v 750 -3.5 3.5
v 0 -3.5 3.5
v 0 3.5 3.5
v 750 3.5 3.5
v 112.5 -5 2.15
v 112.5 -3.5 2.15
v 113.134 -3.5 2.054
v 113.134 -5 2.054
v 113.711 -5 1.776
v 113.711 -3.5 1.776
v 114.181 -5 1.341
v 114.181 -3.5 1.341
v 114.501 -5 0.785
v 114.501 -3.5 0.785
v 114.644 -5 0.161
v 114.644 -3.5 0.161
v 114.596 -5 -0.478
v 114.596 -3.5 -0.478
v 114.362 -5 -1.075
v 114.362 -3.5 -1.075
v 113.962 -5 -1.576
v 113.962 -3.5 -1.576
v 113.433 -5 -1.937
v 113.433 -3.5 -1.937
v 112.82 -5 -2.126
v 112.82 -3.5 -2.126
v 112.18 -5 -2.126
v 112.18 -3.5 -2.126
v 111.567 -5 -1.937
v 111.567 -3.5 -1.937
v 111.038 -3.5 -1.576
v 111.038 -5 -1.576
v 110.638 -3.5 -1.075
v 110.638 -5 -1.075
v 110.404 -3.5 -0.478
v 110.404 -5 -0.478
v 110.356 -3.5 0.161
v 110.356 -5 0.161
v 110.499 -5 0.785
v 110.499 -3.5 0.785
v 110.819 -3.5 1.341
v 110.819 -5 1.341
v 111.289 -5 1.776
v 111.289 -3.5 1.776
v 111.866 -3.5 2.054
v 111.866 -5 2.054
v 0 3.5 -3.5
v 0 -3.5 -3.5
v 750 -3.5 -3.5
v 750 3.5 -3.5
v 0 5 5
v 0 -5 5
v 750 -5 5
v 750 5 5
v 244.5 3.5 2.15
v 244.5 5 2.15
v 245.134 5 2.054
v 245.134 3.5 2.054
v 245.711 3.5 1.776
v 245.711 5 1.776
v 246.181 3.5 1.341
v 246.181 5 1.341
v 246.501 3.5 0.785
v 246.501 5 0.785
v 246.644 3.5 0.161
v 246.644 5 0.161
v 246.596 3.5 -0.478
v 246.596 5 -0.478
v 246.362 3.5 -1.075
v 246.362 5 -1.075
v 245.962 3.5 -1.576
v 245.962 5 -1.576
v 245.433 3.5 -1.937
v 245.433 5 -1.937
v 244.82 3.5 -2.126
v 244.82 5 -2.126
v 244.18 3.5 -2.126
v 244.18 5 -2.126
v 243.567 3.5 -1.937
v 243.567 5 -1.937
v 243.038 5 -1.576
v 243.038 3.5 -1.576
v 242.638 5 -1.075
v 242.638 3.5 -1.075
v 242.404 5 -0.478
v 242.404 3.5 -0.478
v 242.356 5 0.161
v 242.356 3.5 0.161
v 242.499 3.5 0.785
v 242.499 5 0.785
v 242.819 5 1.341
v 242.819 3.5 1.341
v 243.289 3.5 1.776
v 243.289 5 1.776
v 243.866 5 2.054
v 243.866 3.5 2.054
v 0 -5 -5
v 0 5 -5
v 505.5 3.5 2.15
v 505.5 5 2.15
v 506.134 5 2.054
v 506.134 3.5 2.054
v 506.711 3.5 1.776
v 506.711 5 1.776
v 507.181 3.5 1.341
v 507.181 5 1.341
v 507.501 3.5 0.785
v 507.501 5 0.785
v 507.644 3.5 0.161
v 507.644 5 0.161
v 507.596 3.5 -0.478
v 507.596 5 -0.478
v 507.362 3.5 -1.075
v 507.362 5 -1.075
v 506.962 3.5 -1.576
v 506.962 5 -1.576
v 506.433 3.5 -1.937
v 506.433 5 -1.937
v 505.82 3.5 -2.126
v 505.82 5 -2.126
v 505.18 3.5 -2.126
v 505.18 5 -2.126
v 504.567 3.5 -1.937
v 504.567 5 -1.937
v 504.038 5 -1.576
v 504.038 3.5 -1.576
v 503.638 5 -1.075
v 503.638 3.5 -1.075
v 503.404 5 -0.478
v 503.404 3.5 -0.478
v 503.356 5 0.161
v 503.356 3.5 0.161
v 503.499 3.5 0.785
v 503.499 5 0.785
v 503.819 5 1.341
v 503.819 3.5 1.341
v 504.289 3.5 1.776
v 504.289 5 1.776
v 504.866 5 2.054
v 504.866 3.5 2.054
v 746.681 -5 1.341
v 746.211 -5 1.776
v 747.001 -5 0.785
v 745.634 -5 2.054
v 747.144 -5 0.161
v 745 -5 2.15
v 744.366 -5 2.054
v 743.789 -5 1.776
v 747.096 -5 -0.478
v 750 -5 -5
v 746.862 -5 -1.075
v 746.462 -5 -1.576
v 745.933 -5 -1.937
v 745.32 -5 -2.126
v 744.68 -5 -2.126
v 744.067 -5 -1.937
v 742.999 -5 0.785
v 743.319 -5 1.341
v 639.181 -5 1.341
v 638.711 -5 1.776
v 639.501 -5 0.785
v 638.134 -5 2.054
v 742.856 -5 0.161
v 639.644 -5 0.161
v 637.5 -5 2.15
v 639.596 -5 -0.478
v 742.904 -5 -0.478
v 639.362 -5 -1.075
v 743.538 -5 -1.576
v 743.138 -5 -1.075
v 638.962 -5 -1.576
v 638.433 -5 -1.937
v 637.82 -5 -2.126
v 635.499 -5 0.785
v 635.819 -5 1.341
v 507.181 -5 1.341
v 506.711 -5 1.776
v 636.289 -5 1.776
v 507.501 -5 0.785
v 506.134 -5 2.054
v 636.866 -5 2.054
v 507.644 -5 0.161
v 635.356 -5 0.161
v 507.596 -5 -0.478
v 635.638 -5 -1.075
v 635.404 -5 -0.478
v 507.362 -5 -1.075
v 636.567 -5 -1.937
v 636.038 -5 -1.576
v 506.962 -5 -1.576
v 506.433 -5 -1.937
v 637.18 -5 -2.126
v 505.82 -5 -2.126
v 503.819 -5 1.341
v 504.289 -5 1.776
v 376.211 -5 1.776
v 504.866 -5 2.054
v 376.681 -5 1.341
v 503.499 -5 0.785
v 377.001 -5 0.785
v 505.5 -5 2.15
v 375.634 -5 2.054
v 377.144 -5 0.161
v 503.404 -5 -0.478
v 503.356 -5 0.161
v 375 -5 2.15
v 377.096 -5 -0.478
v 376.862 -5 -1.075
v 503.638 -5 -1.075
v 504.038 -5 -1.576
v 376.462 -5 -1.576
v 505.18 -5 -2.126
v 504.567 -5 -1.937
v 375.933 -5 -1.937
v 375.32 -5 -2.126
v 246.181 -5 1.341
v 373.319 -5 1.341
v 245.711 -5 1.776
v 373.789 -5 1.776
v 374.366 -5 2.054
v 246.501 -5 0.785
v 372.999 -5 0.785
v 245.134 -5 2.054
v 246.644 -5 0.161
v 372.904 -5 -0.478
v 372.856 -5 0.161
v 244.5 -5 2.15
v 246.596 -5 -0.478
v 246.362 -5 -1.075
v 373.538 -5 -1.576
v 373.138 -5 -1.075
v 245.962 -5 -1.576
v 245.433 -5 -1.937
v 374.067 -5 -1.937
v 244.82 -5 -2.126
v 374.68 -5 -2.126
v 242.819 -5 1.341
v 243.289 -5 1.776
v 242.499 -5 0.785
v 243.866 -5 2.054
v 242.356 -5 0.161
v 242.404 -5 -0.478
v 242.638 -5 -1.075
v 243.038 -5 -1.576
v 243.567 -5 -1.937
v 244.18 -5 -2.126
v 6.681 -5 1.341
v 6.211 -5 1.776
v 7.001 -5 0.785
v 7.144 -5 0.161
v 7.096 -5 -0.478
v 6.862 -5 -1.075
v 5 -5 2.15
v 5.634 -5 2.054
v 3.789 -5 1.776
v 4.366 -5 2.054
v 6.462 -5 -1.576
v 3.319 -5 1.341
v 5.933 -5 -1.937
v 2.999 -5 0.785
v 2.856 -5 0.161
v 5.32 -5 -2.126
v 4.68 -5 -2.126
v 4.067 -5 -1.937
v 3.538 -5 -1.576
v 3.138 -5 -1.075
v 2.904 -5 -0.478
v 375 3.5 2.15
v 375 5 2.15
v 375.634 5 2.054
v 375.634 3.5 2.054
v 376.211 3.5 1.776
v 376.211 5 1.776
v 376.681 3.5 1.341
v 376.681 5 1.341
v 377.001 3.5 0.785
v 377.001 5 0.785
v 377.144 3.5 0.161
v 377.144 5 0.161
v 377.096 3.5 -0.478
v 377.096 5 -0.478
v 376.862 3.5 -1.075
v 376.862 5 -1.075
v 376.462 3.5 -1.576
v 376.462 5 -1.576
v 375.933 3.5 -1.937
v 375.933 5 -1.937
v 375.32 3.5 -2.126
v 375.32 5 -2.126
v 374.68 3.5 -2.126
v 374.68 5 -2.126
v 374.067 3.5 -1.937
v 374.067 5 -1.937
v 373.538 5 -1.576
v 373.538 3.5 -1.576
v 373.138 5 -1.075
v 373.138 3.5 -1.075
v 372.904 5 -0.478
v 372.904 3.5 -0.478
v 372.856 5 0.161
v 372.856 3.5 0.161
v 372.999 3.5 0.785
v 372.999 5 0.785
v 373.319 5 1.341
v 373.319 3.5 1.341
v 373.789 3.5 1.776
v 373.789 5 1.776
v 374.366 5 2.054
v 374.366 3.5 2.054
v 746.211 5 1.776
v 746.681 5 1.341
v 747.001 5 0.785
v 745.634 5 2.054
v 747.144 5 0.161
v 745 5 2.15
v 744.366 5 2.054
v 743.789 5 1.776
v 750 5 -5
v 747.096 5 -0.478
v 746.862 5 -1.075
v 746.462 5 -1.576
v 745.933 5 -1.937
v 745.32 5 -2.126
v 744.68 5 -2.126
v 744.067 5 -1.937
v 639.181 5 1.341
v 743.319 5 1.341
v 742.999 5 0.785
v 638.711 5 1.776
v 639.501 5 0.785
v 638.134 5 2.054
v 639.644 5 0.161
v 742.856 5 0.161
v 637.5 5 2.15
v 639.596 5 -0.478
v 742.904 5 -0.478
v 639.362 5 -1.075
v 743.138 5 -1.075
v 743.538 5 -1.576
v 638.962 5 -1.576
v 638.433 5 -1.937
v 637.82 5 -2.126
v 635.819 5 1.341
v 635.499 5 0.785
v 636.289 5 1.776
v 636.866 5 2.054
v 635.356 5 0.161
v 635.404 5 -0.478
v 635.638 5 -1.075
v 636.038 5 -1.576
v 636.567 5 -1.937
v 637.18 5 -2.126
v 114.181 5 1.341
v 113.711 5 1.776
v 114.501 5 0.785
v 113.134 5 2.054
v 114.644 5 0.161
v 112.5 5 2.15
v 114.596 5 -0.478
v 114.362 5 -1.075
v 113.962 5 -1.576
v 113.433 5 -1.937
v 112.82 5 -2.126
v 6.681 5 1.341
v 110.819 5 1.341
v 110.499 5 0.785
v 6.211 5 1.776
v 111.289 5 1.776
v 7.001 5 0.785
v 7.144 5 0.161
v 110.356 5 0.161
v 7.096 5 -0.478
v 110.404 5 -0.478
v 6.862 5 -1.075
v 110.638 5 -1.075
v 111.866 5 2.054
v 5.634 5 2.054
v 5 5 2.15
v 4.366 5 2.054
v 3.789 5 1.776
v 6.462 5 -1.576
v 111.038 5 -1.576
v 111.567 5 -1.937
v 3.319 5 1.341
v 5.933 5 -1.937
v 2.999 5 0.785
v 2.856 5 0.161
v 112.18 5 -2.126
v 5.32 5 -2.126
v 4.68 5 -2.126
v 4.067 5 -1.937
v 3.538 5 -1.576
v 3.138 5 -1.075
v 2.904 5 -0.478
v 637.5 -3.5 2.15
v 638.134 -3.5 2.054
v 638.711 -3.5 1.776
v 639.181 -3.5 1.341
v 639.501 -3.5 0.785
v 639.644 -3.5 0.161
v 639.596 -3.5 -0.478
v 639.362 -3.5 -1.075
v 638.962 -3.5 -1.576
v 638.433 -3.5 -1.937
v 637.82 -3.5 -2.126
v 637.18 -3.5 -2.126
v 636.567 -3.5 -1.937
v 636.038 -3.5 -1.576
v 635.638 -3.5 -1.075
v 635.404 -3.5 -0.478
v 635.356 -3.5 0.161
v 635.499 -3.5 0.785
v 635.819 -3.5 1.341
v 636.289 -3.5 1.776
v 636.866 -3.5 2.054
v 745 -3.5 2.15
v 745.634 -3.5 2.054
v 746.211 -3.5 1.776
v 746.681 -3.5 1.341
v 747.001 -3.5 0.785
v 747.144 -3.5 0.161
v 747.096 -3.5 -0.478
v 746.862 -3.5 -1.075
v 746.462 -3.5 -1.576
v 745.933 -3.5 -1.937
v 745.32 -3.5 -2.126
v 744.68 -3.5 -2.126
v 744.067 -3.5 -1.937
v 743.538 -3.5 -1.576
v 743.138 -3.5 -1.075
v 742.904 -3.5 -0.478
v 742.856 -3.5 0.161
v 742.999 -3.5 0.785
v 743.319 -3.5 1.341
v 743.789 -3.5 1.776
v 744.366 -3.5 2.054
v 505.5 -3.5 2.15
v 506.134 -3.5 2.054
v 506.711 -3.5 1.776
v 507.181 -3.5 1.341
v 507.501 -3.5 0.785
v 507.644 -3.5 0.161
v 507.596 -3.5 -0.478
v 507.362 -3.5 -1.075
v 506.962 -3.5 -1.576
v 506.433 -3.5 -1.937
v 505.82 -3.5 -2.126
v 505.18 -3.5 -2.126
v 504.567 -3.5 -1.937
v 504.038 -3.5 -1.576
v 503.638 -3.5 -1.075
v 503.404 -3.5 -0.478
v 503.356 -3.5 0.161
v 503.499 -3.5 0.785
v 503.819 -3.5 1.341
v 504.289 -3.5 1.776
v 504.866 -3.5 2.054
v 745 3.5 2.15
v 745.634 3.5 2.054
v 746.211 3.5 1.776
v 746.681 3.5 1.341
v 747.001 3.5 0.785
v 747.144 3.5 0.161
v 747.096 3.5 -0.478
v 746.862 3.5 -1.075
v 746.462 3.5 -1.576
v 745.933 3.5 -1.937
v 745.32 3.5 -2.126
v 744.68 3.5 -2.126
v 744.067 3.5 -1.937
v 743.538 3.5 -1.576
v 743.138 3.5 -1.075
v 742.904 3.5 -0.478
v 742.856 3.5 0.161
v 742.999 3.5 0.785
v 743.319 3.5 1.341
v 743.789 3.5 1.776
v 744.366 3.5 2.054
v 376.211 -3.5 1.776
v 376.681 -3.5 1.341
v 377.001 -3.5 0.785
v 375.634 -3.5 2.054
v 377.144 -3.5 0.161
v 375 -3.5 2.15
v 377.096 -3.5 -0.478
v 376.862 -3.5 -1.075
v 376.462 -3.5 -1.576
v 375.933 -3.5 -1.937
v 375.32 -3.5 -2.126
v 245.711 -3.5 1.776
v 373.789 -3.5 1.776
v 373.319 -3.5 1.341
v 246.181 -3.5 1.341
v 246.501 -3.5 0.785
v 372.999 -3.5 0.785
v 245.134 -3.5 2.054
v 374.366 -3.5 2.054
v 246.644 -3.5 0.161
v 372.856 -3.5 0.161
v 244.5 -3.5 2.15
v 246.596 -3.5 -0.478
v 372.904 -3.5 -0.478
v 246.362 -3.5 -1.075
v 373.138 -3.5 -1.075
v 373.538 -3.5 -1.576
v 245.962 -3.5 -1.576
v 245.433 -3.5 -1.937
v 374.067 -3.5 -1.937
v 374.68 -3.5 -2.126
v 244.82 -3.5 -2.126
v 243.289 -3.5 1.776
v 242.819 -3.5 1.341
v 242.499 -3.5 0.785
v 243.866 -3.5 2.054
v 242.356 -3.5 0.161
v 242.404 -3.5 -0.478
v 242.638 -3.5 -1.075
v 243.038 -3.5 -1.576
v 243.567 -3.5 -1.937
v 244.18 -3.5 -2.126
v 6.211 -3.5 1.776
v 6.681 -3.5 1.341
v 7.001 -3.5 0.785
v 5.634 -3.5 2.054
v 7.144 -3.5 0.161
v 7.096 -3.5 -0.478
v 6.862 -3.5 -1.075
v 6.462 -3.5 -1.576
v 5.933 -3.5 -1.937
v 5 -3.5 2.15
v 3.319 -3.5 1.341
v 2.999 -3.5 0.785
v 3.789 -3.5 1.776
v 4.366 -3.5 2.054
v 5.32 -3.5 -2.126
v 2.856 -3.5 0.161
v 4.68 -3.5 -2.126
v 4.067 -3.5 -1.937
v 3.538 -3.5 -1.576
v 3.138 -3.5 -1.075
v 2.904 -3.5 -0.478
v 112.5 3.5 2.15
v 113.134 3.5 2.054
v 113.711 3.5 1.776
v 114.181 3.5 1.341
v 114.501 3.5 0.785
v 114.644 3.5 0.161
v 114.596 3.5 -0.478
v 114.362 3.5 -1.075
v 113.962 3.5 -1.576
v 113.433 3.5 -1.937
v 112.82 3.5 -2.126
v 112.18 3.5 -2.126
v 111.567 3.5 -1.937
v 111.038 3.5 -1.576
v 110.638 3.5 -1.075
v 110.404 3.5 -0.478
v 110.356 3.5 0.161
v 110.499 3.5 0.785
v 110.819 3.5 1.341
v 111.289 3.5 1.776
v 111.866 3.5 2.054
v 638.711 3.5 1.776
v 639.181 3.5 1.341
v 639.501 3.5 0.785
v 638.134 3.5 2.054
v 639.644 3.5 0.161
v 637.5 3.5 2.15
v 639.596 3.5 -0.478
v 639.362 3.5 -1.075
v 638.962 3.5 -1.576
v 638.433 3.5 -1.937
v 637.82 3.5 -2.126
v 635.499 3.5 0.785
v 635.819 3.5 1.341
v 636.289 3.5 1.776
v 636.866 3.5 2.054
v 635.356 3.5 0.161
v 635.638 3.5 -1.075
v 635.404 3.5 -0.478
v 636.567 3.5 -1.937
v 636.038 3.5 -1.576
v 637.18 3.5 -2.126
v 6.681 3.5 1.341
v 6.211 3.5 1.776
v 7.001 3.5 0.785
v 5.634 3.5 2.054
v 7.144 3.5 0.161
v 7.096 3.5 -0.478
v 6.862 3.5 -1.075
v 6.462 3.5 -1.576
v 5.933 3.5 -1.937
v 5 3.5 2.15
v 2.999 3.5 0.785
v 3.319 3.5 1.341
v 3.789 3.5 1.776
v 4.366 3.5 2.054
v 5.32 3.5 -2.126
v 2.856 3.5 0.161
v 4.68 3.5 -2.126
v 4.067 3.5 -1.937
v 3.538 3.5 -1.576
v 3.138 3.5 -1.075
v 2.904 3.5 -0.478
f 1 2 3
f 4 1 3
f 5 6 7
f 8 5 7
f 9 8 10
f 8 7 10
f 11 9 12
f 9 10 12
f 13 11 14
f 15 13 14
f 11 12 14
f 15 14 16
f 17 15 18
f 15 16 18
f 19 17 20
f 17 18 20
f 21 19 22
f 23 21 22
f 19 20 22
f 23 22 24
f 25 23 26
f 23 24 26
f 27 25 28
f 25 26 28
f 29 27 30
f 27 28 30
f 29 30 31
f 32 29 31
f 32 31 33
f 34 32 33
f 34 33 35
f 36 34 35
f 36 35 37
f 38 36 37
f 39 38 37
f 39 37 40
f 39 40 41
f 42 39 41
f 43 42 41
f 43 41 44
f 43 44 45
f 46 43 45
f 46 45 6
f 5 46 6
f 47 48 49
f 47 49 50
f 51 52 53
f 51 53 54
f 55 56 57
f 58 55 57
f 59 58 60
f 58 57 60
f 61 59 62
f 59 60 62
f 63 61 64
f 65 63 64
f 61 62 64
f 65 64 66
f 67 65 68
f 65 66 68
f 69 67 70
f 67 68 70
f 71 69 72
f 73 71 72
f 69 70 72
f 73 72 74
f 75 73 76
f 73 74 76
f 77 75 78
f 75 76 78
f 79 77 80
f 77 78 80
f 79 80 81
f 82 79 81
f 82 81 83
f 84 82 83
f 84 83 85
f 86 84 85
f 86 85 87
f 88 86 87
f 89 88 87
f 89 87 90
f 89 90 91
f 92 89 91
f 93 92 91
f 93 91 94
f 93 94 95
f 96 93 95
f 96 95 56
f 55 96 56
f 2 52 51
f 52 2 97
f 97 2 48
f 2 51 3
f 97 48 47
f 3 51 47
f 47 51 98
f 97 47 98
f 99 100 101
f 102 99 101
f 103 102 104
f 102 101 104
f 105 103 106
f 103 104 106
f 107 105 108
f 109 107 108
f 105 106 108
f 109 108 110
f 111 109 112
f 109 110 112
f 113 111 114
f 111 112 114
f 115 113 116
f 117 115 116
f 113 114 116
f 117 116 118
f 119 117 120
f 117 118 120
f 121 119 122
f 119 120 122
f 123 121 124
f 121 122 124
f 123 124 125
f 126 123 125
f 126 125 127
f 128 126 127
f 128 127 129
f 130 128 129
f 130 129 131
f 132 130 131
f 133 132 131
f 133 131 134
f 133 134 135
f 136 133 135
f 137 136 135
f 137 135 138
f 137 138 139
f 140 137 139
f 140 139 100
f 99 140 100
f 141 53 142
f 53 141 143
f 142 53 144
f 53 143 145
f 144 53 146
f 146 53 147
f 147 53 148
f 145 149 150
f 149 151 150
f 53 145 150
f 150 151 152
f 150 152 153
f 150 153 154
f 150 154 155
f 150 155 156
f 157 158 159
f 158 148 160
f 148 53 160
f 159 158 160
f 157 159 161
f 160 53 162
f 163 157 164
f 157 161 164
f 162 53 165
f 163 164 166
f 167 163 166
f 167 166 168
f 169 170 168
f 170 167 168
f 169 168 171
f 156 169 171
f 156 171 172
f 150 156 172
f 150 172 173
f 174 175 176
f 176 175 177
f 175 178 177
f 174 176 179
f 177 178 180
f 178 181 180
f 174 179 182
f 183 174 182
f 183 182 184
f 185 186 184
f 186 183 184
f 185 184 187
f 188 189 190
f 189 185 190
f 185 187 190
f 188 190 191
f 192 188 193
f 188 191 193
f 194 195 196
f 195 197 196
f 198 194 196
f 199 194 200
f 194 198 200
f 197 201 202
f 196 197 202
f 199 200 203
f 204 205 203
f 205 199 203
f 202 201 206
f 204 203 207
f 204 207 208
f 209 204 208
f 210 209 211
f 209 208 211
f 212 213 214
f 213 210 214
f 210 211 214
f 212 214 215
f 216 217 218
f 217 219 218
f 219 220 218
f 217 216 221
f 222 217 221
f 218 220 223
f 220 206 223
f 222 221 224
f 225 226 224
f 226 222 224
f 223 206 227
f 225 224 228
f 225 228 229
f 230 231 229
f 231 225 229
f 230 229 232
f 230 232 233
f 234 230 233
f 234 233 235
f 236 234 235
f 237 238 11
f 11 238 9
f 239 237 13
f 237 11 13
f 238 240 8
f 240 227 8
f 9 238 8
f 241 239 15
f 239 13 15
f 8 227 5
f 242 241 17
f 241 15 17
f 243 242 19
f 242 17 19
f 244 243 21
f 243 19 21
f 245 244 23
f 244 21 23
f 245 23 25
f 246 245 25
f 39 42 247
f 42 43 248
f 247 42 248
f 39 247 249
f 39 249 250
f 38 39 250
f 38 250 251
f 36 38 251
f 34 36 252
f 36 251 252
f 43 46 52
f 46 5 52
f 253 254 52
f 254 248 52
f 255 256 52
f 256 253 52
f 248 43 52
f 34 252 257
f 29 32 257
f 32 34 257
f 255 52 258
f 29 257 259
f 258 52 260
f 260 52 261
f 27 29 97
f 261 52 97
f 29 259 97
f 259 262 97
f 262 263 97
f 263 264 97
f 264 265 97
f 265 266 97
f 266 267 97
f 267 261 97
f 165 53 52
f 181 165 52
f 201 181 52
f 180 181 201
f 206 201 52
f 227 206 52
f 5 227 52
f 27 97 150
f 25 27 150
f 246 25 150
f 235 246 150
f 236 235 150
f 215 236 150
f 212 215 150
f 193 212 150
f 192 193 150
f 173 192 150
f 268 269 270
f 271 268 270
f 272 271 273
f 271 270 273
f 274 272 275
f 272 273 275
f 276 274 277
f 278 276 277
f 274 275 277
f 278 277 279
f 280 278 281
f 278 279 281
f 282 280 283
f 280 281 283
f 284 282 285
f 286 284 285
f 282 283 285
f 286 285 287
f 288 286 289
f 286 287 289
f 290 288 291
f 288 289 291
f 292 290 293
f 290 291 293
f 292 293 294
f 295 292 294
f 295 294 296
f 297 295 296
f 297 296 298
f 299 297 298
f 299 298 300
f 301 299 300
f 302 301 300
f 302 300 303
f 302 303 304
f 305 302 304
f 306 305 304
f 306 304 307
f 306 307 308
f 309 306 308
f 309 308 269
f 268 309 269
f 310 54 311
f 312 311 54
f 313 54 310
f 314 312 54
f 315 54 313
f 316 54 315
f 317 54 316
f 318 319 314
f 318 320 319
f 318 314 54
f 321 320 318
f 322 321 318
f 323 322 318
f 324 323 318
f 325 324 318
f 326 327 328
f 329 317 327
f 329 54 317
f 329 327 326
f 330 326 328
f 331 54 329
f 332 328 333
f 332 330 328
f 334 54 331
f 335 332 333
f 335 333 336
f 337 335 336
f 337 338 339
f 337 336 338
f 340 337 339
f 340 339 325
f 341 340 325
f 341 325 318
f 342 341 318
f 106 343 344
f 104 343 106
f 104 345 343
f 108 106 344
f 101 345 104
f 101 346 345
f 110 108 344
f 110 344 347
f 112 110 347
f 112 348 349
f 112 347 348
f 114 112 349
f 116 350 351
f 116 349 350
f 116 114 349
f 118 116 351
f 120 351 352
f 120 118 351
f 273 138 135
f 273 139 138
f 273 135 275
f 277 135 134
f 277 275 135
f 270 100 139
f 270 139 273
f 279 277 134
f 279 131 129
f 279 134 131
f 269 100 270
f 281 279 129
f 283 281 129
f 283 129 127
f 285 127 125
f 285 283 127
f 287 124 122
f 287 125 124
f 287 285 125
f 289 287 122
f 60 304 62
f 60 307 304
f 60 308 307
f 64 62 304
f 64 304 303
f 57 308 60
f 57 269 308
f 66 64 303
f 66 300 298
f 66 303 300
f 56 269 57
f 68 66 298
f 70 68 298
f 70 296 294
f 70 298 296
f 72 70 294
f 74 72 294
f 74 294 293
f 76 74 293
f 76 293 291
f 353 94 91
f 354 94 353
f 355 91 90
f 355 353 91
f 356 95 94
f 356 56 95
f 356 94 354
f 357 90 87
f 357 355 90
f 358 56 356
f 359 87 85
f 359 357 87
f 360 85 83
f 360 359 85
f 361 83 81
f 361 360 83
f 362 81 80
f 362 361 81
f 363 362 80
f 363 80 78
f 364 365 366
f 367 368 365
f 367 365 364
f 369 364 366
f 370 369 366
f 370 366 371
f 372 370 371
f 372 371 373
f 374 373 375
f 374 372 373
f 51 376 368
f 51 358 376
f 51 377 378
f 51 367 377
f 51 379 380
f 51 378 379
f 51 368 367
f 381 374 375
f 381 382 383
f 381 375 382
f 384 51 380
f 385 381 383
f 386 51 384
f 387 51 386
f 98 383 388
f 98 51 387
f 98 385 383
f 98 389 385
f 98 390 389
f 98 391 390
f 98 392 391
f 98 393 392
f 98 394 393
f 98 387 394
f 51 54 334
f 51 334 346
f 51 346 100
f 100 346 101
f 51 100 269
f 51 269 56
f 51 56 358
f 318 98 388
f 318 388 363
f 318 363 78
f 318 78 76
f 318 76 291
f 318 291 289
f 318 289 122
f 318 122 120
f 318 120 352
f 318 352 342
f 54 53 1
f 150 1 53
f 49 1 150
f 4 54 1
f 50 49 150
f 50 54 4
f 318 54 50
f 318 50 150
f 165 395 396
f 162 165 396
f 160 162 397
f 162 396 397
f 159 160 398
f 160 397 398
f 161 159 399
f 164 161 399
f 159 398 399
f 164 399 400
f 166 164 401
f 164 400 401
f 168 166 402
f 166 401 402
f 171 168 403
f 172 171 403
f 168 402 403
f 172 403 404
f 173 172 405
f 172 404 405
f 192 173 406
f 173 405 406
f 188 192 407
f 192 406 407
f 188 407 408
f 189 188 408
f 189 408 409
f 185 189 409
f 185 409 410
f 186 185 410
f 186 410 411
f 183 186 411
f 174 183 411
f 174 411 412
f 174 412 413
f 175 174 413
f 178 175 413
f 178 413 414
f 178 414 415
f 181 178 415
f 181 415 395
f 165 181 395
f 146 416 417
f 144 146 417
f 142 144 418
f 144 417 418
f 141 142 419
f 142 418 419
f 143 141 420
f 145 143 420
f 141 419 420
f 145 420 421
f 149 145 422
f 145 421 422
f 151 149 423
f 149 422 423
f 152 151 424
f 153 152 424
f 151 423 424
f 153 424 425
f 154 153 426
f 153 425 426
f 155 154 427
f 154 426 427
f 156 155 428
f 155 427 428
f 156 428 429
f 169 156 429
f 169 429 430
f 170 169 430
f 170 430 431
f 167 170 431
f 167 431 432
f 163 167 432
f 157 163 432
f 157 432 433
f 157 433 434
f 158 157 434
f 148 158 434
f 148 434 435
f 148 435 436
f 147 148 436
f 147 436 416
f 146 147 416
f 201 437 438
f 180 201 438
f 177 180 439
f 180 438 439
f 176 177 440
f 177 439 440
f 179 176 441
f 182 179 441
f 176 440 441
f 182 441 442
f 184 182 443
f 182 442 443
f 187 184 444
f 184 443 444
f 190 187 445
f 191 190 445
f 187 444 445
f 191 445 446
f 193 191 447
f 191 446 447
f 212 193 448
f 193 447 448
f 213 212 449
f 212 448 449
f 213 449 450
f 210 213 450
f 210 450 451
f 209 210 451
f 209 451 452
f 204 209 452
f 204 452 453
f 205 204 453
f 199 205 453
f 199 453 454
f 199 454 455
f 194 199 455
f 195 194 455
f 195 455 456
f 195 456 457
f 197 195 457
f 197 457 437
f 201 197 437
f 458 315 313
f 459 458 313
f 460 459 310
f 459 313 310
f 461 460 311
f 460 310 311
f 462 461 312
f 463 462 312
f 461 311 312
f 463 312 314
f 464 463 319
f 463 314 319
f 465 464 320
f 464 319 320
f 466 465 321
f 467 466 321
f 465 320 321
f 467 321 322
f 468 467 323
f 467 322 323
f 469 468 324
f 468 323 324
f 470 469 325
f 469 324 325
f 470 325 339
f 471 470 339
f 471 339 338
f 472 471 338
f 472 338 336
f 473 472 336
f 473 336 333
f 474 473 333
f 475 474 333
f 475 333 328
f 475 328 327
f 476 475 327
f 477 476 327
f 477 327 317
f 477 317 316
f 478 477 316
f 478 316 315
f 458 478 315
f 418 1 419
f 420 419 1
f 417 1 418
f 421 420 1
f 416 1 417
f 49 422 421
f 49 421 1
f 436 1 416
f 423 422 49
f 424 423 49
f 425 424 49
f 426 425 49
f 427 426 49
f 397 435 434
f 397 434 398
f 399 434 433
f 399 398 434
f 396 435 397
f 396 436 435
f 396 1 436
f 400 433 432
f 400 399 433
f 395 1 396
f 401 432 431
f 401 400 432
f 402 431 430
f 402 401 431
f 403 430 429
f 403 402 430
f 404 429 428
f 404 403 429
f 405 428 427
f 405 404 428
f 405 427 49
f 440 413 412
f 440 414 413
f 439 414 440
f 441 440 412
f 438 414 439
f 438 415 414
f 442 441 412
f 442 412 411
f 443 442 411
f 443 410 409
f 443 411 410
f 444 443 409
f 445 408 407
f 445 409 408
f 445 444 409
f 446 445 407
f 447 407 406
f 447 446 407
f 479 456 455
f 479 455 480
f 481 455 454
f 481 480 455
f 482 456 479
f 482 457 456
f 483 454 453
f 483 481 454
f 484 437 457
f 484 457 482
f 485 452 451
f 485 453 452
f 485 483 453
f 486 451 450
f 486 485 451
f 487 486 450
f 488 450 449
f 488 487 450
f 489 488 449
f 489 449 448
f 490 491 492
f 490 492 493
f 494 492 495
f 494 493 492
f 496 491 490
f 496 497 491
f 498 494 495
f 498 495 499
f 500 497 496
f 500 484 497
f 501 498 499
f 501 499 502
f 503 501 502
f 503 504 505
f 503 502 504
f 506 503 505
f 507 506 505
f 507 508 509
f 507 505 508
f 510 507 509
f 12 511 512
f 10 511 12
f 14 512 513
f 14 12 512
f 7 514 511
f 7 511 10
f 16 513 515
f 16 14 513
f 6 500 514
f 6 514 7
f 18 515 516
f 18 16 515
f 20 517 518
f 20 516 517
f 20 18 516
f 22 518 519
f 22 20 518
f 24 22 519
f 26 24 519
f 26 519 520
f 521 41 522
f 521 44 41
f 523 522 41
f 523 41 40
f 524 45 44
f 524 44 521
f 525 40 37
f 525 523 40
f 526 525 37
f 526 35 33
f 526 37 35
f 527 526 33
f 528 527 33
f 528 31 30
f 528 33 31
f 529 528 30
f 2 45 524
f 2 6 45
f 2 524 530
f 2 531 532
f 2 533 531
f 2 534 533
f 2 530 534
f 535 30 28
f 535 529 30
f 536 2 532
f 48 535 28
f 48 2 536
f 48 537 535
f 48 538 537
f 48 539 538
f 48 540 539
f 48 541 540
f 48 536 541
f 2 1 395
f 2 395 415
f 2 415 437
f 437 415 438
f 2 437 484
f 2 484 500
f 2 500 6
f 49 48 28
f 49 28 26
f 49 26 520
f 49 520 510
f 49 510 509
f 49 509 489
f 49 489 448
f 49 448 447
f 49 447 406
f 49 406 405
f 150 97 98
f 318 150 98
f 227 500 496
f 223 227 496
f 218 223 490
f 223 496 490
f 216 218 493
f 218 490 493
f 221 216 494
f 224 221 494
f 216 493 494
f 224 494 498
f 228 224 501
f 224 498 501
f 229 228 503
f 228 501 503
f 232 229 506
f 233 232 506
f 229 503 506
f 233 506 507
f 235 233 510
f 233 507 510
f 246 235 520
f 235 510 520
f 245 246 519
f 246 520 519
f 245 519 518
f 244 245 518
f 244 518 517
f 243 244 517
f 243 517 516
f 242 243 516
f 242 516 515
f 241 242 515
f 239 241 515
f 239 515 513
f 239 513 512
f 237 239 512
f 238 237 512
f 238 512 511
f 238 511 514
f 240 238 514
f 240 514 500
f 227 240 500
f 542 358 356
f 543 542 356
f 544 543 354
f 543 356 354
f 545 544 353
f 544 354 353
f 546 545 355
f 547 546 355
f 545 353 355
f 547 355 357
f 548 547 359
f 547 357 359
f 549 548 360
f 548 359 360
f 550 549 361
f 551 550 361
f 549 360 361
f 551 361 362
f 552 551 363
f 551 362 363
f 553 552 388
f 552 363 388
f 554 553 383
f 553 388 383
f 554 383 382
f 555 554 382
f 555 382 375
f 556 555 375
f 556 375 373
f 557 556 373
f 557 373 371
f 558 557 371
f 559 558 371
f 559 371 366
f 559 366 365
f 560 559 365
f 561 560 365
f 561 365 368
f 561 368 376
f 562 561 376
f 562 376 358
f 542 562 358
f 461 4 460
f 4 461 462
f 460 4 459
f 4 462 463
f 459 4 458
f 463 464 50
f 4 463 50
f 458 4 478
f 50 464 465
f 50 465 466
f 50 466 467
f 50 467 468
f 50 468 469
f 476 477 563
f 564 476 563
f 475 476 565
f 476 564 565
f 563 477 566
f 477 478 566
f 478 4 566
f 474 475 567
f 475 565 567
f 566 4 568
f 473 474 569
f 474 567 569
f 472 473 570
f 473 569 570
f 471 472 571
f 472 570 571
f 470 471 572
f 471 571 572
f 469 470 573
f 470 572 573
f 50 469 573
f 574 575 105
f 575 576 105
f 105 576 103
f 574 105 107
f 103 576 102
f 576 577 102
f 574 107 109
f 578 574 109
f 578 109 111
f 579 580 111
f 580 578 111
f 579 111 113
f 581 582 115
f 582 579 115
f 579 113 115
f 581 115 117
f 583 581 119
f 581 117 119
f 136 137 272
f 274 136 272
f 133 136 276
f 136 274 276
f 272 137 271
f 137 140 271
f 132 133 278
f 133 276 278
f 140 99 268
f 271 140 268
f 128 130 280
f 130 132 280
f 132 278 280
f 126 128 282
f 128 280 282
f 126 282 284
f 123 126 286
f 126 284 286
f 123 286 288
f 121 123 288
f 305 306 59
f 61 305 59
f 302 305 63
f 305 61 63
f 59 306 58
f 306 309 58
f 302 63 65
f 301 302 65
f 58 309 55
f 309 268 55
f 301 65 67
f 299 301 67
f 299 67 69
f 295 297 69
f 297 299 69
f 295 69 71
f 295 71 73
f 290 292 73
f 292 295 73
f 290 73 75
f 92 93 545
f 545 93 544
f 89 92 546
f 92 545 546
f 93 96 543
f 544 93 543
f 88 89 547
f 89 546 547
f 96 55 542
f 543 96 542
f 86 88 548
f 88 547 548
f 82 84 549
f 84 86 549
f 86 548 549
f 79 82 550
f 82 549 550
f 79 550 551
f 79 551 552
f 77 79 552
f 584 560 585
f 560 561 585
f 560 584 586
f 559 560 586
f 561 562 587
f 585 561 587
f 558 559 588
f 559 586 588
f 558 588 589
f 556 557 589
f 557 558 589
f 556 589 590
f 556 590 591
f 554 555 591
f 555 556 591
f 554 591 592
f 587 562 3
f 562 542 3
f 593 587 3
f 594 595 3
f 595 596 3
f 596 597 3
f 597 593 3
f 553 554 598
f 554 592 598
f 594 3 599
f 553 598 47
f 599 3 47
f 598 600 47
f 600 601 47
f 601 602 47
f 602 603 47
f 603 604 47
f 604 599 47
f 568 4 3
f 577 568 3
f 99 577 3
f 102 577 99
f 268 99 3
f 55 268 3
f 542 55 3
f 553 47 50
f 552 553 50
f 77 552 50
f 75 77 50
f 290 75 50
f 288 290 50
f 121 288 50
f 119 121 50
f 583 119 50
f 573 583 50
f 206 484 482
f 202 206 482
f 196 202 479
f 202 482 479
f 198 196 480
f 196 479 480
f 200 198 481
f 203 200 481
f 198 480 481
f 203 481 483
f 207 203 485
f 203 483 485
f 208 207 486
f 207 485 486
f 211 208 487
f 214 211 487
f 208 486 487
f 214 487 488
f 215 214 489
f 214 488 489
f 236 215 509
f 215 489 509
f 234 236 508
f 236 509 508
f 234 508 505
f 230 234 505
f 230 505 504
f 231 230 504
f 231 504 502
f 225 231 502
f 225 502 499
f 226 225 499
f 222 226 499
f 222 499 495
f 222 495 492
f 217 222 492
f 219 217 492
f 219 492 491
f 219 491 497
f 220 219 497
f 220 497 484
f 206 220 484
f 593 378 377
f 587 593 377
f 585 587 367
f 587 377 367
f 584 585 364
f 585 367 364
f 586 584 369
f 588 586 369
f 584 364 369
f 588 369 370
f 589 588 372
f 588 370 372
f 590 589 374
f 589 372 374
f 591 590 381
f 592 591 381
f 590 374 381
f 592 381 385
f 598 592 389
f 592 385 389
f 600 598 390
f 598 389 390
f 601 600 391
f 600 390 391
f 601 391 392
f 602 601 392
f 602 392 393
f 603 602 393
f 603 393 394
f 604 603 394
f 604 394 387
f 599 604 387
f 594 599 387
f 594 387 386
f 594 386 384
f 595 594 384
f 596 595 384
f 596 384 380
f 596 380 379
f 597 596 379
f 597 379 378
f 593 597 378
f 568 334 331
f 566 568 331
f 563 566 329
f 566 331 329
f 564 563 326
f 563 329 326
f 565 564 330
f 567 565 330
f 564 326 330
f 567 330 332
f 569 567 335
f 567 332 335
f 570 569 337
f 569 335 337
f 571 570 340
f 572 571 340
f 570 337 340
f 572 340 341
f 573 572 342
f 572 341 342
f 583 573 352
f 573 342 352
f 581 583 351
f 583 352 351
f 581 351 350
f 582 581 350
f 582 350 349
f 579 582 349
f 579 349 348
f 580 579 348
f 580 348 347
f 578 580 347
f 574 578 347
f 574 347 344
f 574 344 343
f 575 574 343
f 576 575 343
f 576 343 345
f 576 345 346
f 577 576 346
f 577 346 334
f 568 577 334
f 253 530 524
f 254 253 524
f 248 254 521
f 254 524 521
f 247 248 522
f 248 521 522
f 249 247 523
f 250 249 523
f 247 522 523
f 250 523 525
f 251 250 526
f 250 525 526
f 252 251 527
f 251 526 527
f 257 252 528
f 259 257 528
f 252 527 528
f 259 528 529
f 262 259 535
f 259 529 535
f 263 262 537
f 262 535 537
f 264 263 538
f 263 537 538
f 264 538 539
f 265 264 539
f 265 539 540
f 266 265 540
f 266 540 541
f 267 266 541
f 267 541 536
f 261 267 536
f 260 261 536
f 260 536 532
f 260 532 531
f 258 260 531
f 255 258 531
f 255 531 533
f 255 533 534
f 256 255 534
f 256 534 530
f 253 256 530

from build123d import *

# Parameters (mm, degrees)
SKETCH_1_W          = 10
SKETCH_1_H          = 10
SKETCH_1_W_2        = 7
SKETCH_1_H_2        = 7
EXTRUDE_1_DEPTH     = 750
SKETCH_2_R          = 2.15
CUT_EXTRUDE_1_DEPTH = 751.083328704


with BuildPart() as part:
    # ｽｹｯﾁ1 → 押し出し-薄板1 (new body)
    with BuildSketch(Plane(origin=(0, 0, 0), x_dir=(0, 0, -1), z_dir=(1, 0, 0))):
        Rectangle(SKETCH_1_W, SKETCH_1_H)
        Rectangle(SKETCH_1_W_2, SKETCH_1_H_2, mode=Mode.SUBTRACT)
    extrude(amount=EXTRUDE_1_DEPTH)

    # ｽｹｯﾁ2 → ｶｯﾄ - 押し出し1 (cut, through all)
    with BuildSketch(Plane(origin=(0, 5, 0), x_dir=(1, 0, 0), z_dir=(0, 1, 0))):
        with Locations(Location((745, 0, 0), (0, 0, 270))):
            Circle(SKETCH_2_R)
        with Locations(Location((5, 0, 0), (0, 0, 270))):
            Circle(SKETCH_2_R)
        with Locations(Location((505.5, 0, 0), (0, 0, 270))):
            Circle(SKETCH_2_R)
        with Locations(Location((244.5, 0, 0), (0, 0, 270))):
            Circle(SKETCH_2_R)
        with Locations(Location((637.5, 0, 0), (0, 0, 270))):
            Circle(SKETCH_2_R)
        with Locations(Location((112.5, 0, 0), (0, 0, 270))):
            Circle(SKETCH_2_R)
        with Locations(Location((375, 0, 0), (0, 0, 270))):
            Circle(SKETCH_2_R)
    extrude(amount=-CUT_EXTRUDE_1_DEPTH, mode=Mode.SUBTRACT)


solid = part.part
